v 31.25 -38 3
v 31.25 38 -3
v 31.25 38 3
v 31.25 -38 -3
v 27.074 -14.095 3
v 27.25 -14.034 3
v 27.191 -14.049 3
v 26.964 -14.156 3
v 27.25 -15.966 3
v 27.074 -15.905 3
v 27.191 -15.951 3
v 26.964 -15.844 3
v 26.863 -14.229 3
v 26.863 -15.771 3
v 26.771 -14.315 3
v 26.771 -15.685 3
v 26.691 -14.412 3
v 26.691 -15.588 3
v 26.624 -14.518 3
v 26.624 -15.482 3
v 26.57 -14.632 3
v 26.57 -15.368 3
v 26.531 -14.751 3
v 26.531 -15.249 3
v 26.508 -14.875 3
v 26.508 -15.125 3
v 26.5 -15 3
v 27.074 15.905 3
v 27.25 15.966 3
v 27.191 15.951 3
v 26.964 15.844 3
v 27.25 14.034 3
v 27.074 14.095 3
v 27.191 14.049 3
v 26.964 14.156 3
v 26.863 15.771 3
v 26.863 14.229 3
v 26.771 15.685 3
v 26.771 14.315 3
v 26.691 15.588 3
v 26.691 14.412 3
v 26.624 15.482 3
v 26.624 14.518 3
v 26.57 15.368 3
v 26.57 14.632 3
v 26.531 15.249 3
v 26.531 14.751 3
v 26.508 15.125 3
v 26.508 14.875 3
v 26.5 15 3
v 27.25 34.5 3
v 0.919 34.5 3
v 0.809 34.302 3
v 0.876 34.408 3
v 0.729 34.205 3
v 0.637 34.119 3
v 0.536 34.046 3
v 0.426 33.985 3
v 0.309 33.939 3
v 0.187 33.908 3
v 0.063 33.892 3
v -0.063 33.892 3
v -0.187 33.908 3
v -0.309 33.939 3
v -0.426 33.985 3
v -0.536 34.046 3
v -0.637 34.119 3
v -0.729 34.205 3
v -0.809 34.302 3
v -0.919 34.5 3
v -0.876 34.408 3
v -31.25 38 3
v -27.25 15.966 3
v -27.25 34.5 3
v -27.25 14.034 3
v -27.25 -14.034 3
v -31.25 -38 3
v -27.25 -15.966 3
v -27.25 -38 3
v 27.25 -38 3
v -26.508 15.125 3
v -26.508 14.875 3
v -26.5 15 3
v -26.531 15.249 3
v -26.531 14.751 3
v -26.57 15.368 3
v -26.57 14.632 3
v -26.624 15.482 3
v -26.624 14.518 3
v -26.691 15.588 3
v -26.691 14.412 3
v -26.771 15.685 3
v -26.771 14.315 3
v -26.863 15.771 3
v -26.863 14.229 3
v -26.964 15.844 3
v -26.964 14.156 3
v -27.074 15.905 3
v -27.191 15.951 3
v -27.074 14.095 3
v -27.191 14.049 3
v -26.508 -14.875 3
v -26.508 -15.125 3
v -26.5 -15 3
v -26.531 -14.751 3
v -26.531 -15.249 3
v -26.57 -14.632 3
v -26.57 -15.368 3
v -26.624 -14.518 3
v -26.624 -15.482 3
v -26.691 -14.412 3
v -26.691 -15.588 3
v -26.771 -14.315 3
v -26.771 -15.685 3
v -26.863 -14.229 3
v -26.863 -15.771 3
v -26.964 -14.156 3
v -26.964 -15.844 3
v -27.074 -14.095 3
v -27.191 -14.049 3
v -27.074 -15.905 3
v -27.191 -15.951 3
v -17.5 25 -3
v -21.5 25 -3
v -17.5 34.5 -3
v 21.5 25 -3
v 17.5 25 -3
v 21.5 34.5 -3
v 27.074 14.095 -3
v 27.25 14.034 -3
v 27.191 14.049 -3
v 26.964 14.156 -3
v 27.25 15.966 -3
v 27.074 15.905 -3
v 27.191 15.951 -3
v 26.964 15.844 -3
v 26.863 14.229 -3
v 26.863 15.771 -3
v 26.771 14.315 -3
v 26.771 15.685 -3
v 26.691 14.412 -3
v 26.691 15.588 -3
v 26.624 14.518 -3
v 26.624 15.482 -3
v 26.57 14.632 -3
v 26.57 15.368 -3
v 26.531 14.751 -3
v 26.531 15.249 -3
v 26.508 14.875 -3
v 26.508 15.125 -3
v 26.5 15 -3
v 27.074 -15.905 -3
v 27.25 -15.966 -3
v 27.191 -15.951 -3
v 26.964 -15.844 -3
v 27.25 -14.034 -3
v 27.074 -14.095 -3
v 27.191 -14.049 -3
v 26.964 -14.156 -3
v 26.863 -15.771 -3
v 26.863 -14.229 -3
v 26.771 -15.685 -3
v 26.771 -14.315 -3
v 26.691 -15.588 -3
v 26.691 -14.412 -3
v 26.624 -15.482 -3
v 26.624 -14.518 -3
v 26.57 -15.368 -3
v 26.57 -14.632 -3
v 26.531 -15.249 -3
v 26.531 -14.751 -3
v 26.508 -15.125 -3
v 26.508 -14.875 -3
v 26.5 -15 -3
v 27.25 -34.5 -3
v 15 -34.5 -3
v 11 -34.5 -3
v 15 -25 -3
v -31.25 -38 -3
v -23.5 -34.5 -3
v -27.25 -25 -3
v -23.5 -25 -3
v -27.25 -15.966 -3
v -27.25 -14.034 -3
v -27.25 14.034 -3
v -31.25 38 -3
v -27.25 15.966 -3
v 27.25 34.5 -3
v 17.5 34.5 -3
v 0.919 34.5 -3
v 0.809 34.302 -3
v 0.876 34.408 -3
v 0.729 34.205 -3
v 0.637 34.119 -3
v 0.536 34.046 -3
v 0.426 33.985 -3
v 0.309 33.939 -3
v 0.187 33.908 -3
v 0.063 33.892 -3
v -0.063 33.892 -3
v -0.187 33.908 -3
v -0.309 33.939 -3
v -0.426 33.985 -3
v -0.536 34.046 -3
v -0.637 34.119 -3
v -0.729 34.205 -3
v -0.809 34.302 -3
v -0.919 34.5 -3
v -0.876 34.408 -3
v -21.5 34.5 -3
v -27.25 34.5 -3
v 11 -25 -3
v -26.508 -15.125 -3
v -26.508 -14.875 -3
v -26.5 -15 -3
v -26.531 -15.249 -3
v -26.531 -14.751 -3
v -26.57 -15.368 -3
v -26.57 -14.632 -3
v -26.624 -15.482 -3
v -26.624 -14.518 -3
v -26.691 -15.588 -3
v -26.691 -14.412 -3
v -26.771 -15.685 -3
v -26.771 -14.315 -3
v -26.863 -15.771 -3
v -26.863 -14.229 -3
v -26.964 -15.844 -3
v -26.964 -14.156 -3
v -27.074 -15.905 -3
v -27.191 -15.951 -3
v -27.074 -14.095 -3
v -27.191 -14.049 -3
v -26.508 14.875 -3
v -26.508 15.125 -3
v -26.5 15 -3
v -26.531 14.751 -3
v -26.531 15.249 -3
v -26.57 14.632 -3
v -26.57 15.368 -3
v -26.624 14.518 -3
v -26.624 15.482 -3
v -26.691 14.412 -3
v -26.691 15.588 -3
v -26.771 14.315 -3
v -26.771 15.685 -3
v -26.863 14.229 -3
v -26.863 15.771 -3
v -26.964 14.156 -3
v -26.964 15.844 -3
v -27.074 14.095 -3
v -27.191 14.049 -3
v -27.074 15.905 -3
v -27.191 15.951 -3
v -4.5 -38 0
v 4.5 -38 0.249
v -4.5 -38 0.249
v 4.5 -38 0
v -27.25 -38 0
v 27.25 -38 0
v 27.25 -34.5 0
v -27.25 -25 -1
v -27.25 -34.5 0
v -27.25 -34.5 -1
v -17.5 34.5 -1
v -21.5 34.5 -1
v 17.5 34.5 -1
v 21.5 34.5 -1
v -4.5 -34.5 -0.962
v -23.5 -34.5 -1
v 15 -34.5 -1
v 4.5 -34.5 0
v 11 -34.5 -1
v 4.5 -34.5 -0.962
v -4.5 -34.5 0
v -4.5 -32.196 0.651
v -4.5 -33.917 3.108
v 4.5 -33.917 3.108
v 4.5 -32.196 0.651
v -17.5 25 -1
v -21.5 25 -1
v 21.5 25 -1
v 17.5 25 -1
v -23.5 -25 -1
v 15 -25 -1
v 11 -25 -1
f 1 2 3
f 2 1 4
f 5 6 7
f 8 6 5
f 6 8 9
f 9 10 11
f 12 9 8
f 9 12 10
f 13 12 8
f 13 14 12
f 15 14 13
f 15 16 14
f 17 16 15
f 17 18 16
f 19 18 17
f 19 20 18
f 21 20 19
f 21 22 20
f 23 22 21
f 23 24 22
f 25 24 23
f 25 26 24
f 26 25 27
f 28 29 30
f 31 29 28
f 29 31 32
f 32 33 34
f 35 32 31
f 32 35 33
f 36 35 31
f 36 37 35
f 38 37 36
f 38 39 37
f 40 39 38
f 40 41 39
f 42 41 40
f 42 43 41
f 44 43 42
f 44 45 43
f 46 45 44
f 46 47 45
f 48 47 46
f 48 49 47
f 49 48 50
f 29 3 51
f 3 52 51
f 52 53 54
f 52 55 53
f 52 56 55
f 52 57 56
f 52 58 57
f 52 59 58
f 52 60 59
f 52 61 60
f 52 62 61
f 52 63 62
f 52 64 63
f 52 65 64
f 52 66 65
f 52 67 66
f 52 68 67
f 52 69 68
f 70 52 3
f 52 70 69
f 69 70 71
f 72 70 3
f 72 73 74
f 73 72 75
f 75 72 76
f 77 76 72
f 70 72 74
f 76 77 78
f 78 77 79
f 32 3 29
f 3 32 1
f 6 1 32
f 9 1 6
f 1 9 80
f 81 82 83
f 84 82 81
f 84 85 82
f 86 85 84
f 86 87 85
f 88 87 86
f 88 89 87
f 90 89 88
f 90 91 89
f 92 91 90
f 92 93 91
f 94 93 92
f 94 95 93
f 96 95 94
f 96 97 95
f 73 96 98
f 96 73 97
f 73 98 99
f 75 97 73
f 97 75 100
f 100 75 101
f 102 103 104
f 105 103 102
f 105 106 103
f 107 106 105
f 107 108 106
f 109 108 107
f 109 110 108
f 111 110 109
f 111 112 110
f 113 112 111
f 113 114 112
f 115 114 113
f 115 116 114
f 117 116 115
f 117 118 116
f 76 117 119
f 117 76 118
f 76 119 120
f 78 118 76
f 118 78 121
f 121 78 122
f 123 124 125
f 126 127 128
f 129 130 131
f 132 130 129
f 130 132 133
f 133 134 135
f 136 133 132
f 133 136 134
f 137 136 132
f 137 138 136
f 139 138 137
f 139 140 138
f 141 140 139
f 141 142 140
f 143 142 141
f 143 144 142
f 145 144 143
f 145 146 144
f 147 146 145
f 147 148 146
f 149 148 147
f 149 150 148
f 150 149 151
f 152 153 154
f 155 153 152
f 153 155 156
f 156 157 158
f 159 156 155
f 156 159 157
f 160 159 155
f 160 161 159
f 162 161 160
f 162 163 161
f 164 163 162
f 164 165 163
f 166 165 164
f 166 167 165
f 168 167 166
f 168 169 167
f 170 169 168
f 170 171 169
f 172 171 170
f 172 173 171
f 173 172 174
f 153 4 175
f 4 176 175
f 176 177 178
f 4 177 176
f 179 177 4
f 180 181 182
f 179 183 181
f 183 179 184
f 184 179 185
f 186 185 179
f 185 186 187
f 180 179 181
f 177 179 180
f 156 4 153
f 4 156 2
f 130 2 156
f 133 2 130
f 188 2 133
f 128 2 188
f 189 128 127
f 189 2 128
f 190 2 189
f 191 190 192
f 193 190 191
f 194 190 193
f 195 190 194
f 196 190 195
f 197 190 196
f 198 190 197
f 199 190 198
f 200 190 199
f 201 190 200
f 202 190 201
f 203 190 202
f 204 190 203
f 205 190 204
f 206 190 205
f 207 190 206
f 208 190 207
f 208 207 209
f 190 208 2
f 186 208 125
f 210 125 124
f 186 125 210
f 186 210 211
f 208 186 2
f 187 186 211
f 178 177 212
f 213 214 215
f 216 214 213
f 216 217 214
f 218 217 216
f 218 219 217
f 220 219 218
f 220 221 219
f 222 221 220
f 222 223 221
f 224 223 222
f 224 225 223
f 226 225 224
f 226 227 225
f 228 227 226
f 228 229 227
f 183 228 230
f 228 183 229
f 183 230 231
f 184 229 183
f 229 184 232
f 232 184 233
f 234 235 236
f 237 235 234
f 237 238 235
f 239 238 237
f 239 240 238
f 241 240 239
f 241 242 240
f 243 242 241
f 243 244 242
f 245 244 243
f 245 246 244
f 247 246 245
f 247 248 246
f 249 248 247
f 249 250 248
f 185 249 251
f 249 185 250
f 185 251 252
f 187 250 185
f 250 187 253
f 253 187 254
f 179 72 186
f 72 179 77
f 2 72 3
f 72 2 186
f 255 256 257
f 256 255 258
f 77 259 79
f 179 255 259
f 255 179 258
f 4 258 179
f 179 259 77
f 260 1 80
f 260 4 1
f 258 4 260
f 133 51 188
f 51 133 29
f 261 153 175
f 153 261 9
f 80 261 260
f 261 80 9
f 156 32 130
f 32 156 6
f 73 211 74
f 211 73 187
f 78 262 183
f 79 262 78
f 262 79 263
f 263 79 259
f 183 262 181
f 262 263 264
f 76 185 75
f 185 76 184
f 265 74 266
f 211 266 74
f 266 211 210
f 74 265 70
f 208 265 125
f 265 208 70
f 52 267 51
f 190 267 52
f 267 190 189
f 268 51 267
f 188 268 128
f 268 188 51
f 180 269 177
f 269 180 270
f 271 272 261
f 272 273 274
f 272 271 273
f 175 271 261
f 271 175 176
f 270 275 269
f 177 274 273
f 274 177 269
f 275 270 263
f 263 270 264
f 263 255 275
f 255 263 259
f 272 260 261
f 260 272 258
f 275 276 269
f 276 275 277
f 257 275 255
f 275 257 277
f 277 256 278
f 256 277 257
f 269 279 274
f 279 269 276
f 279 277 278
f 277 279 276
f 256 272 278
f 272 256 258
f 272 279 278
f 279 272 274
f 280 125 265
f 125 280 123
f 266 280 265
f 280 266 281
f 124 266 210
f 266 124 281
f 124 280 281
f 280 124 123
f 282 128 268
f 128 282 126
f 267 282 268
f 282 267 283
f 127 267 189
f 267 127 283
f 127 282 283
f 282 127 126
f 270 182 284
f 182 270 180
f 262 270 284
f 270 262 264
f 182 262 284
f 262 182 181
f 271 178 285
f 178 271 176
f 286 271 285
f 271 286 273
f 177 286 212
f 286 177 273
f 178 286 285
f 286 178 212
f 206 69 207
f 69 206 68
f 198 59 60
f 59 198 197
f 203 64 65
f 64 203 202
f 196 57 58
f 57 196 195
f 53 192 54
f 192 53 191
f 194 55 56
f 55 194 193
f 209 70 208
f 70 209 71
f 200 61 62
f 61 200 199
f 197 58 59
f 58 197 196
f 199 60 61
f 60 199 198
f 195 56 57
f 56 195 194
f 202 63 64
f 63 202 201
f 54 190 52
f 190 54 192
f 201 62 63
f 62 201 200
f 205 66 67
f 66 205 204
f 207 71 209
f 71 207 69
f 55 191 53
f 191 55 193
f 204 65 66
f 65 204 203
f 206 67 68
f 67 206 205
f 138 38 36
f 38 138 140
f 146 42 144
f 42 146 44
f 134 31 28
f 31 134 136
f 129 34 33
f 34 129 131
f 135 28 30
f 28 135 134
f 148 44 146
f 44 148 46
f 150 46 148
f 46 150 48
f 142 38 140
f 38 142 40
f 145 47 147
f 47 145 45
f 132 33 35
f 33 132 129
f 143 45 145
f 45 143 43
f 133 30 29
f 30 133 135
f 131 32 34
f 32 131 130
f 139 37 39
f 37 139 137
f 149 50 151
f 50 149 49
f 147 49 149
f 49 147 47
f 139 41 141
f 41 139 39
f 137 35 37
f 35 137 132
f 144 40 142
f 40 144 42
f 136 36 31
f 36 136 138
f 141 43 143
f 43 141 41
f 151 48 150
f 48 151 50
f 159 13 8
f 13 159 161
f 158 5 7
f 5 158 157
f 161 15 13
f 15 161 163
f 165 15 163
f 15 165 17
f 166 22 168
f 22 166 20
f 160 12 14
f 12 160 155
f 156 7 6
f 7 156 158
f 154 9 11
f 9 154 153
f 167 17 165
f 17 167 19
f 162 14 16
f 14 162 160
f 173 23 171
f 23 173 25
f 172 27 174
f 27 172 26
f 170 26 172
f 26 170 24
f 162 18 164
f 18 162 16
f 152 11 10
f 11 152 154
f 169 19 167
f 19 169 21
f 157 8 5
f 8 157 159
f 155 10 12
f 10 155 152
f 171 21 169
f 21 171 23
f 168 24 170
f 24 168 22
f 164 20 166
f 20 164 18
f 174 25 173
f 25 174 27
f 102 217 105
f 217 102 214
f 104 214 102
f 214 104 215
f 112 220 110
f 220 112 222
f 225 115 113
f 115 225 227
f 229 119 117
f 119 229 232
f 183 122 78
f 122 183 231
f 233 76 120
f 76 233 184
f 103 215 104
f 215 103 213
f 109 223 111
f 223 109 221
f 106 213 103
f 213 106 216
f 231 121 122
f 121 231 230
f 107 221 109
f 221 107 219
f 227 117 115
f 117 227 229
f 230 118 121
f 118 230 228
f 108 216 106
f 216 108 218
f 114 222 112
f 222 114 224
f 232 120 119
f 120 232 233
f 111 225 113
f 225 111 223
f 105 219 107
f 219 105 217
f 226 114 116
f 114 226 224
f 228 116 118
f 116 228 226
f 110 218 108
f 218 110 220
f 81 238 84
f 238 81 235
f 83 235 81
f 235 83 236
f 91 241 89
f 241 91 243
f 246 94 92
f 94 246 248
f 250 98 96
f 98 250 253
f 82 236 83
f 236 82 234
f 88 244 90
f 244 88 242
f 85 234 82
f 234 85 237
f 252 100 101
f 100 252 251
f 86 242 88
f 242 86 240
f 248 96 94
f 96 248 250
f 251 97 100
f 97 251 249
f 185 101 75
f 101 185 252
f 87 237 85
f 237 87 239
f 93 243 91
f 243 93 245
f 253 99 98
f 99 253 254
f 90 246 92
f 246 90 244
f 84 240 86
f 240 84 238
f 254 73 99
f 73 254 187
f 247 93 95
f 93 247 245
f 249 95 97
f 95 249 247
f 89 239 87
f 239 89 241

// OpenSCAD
// Base Arduino
//
// (c) 2014 Afonso Coutinho <afonso@yack.com.br>
//
// This program is free software: you can redistribute it and/or modify
// it under the terms of the GNU General Public License as published by
// the Free Software Foundation, either version 2 of the License, or
// (at your option) any later version.
//
// This program is distributed in the hope that it will be useful,
// but WITHOUT ANY WARRANTY; without even the implied warranty of
// MERCHANTABILITY or FITNESS FOR A PARTICULAR PURPOSE.  See the
// GNU General Public License for more details.
//
// You should have received a copy of the GNU General Public License
// along with this program.  If not, see <http://www.gnu.org/licenses/>.

$fn = 50;
difference(){
	cube([62.5, 76, 6], center = true);
	translate([0, 0, 0]){
		cube([54.5, 69, 12], center = true);
	}
	translate([0, -36, 6]){
		cube([54.5, 6, 12], center = true);
	}
}

translate([-19.5, 30, -2]){
	cube([4, 10, 2], center = true);
}
translate([19.5, 30, -2]){
	cube([4, 10, 2], center = true);
}
translate([-25.5, -30, -2]){
	cube([4, 10, 2], center = true);
}
translate([13, -30, -2]){
	cube([4, 10, 2], center = true);
}
difference(){
	rotate([35,0,0]){
		translate([0, -29, 20.5]){
			cube([9, 6, 3], center = true);
		}
	}
	translate([0, -40.5, 0]){
		cube([10, 5, 10], center = true);
	}
}
translate([0, 34.89, 0]){
	cylinder(r = 1, h = 6, center = true);
}
translate([27.5, 15, 0]){
	cylinder(r = 1, h = 6, center = true);
}
translate([27.5, -15, 0]){
	cylinder(r = 1, h = 6, center = true);
}
translate([-27.5, -15, 0]){
	cylinder(r = 1, h = 6, center = true);
}
translate([-27.5, 15, 0]){
	cylinder(r = 1, h = 6, center = true);
}
